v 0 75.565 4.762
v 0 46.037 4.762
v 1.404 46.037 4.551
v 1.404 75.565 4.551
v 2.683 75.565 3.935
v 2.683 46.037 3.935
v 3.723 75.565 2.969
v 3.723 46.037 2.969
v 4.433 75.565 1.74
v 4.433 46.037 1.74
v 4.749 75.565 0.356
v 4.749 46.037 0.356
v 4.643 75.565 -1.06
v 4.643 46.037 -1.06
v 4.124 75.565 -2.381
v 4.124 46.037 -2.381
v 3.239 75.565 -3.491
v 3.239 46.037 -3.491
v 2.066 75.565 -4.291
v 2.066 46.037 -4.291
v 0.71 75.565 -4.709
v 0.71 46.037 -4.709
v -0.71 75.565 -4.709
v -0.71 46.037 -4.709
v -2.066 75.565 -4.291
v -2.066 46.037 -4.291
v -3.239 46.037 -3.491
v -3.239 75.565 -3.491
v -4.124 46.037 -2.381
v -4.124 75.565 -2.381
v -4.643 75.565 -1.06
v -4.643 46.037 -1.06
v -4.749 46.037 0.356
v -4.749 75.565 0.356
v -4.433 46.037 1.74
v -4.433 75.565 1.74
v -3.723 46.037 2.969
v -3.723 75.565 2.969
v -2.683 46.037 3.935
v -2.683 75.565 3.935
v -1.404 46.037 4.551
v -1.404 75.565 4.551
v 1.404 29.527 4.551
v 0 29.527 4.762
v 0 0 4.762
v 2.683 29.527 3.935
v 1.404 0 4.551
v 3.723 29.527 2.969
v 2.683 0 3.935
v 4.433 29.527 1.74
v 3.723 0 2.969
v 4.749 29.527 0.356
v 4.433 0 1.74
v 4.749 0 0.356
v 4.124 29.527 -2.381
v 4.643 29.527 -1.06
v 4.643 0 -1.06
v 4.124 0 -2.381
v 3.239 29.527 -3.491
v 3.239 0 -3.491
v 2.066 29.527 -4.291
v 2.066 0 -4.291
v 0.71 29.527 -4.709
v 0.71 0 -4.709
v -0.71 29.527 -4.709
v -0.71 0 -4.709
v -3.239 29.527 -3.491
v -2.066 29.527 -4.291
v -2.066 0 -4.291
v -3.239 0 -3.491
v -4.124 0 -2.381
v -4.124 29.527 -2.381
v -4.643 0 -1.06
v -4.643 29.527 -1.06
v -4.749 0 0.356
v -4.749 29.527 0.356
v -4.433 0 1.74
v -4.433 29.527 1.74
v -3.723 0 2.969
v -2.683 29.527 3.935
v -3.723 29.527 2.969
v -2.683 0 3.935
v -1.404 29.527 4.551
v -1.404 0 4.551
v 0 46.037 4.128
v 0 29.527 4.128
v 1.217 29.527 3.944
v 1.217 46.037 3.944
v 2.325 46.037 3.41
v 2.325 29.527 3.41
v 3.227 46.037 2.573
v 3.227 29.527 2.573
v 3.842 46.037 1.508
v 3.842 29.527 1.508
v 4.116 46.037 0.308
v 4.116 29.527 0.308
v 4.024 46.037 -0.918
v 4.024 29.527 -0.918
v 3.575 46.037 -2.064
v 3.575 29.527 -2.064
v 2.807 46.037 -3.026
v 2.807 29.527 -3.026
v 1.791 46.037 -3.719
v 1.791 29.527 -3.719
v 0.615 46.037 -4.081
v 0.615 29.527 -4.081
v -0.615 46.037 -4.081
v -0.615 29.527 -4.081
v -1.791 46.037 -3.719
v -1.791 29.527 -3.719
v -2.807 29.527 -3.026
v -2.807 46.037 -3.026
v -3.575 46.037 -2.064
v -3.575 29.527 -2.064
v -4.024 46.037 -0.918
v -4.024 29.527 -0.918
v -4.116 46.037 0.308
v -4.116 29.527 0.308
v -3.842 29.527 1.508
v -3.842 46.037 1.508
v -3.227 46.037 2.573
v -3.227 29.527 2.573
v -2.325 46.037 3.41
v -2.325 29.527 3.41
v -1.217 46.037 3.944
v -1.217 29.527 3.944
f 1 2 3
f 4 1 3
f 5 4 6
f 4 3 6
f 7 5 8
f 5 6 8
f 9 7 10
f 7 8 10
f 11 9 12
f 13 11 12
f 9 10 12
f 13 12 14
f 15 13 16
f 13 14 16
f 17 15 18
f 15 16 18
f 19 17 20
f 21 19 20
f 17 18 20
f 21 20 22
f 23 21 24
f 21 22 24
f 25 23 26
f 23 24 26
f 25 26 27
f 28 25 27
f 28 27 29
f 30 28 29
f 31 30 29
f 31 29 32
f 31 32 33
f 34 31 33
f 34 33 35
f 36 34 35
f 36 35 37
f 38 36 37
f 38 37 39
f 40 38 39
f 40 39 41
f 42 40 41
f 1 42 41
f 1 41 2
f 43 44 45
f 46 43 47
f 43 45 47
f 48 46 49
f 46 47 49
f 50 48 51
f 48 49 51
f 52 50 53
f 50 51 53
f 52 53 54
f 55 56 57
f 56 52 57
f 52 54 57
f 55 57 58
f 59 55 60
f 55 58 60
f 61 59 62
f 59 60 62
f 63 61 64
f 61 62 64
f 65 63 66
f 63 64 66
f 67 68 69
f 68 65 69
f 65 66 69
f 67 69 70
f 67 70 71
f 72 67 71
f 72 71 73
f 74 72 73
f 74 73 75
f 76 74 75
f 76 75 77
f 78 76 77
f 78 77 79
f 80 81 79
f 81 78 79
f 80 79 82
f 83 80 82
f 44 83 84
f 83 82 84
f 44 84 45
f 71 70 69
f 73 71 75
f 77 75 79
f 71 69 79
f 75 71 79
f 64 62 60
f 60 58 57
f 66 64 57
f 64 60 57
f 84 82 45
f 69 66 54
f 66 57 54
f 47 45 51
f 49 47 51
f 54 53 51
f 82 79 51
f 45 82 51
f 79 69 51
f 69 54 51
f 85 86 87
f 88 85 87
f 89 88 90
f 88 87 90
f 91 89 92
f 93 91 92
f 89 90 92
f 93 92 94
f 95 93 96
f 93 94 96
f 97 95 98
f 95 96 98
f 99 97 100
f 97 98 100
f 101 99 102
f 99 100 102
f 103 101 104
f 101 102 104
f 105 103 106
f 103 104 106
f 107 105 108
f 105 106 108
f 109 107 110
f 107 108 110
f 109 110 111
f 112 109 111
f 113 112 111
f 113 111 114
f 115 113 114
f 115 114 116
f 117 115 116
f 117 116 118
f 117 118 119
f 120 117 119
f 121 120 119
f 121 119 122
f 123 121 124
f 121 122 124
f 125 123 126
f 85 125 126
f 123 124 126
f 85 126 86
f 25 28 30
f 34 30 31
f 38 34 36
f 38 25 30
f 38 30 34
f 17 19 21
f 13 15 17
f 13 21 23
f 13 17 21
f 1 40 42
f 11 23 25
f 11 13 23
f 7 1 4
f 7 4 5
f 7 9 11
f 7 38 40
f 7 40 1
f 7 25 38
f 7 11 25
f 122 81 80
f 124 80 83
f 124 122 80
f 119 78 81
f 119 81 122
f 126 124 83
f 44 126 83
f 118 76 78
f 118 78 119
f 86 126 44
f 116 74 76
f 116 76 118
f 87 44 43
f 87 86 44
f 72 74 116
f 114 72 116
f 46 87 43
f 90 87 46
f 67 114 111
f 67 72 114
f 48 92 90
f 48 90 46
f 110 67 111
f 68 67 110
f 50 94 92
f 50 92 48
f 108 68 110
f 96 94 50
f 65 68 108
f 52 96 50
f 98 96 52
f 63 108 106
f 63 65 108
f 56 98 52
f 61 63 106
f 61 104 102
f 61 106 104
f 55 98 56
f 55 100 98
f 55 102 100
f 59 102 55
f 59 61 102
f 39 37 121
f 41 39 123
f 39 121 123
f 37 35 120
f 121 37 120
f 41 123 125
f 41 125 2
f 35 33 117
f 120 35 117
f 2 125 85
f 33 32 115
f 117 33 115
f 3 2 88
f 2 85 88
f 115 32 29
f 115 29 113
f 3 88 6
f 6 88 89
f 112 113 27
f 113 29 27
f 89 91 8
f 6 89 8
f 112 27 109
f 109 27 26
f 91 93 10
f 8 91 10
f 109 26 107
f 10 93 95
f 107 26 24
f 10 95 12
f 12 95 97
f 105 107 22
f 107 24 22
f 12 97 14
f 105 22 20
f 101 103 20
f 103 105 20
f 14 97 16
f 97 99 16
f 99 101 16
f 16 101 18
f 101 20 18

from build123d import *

# Parameters (mm, degrees)
SKETCH2_R               = 4.7625
BOSS_EXTRUDE1_DEPTH     = 75.565
CUT_EXTRUDE1_DEPTH      = 8.255
CUT_EXTRUDE1_DEPTH_BACK = 8.255
SKETCH3_OUTSIDE_W       = 26.878
SKETCH3_OUTSIDE_H       = 26.878
SKETCH3_OUTSIDE_R       = 4.1275


with BuildPart() as part:
    # Sketch2 → Boss-Extrude1 (new body)
    with BuildSketch(Plane(origin=(0, 0, 0), x_dir=(1, 0, 0), z_dir=(0, 1, 0))):
        with Locations(Location((0, 0, 0), (0, 0, 270))):
            Circle(SKETCH2_R)
    extrude(amount=BOSS_EXTRUDE1_DEPTH)

    # Sketch3 outside → Cut-Extrude1 (cut, two sides: drawn at the far end of the back side and taken through both)
    with BuildSketch(Plane(origin=(0, 37.7825, 0), x_dir=(1, 0, 0), z_dir=(0, 1, 0)).offset(-CUT_EXTRUDE1_DEPTH_BACK)):
        Rectangle(SKETCH3_OUTSIDE_W, SKETCH3_OUTSIDE_H)
        with Locations(Location((0, 0, 0), (0, 0, 270))):
            Circle(SKETCH3_OUTSIDE_R, mode=Mode.SUBTRACT)
    extrude(amount=CUT_EXTRUDE1_DEPTH + CUT_EXTRUDE1_DEPTH_BACK, mode=Mode.SUBTRACT)


solid = part.part
